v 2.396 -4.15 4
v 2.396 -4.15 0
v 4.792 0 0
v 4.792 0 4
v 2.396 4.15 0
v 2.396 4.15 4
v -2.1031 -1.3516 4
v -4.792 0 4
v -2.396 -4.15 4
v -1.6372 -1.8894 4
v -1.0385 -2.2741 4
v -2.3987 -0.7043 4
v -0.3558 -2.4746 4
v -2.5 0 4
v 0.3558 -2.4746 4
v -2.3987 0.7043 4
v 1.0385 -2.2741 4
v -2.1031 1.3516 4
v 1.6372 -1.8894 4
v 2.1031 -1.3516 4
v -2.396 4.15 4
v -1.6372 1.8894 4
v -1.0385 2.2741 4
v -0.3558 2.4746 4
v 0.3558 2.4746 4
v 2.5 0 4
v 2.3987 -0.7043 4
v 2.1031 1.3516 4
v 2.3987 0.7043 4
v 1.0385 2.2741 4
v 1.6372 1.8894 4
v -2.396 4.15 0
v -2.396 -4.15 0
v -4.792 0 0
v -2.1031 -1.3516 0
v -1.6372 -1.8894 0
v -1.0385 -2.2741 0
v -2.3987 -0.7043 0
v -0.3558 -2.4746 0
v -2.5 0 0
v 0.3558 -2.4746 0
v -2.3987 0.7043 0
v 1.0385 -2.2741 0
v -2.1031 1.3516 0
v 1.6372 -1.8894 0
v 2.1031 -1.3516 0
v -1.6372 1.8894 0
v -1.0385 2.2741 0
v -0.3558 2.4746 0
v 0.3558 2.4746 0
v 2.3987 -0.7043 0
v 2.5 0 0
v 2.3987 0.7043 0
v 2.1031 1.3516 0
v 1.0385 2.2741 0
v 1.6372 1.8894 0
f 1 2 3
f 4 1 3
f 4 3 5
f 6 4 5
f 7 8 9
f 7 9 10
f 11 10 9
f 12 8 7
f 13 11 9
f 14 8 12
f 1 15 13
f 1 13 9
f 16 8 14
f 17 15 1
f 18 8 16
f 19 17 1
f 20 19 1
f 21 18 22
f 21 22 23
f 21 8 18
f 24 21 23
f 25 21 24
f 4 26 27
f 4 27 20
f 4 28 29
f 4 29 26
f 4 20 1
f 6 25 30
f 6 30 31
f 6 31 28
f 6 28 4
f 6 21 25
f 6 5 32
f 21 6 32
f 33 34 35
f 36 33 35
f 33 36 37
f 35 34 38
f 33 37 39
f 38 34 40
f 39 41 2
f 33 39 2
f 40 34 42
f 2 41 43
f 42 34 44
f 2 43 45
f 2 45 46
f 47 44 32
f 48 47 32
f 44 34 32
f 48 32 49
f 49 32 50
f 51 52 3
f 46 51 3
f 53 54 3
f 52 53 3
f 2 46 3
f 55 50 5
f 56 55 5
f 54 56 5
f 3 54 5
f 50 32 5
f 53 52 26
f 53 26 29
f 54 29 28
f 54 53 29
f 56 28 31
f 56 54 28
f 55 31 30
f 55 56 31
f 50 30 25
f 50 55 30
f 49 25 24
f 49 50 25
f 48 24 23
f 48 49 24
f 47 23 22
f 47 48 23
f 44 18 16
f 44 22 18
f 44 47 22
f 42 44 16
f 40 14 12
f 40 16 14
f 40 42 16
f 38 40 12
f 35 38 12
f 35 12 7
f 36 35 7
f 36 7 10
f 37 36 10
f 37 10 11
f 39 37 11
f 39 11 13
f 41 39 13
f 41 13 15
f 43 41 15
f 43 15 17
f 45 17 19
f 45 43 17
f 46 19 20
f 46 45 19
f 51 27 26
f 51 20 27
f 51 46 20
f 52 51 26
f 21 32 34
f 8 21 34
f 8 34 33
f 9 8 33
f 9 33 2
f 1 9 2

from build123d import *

# Parameters (mm, degrees)
EXTRUDE_485_DEPTH         = 4
CUT_EXTRUDE_M5_DEPTH      = 8.495721002
CUT_EXTRUDE_M5_DEPTH_BACK = 8.495721002
SKETCH_527_R              = 2.5


with BuildPart() as part:
    # Sketch 341 → Extrude 485 (new body)
    with BuildSketch(Plane.XY):
        Polygon((4.792007234, 0), (2.396003617, 4.15), (-2.396003617, 4.15), (-4.792007234, 0), (-2.396003617, -4.15), (2.396003617, -4.15), align=None)
    extrude(amount=EXTRUDE_485_DEPTH)

    # Sketch 527 → Отверстие_под_M5 (cut, two sides: drawn at the far end of the back side and taken through both)
    with BuildSketch(Plane.XY.offset(-CUT_EXTRUDE_M5_DEPTH_BACK)):
        Circle(SKETCH_527_R)
    extrude(amount=CUT_EXTRUDE_M5_DEPTH + CUT_EXTRUDE_M5_DEPTH_BACK, mode=Mode.SUBTRACT)


solid = part.part
